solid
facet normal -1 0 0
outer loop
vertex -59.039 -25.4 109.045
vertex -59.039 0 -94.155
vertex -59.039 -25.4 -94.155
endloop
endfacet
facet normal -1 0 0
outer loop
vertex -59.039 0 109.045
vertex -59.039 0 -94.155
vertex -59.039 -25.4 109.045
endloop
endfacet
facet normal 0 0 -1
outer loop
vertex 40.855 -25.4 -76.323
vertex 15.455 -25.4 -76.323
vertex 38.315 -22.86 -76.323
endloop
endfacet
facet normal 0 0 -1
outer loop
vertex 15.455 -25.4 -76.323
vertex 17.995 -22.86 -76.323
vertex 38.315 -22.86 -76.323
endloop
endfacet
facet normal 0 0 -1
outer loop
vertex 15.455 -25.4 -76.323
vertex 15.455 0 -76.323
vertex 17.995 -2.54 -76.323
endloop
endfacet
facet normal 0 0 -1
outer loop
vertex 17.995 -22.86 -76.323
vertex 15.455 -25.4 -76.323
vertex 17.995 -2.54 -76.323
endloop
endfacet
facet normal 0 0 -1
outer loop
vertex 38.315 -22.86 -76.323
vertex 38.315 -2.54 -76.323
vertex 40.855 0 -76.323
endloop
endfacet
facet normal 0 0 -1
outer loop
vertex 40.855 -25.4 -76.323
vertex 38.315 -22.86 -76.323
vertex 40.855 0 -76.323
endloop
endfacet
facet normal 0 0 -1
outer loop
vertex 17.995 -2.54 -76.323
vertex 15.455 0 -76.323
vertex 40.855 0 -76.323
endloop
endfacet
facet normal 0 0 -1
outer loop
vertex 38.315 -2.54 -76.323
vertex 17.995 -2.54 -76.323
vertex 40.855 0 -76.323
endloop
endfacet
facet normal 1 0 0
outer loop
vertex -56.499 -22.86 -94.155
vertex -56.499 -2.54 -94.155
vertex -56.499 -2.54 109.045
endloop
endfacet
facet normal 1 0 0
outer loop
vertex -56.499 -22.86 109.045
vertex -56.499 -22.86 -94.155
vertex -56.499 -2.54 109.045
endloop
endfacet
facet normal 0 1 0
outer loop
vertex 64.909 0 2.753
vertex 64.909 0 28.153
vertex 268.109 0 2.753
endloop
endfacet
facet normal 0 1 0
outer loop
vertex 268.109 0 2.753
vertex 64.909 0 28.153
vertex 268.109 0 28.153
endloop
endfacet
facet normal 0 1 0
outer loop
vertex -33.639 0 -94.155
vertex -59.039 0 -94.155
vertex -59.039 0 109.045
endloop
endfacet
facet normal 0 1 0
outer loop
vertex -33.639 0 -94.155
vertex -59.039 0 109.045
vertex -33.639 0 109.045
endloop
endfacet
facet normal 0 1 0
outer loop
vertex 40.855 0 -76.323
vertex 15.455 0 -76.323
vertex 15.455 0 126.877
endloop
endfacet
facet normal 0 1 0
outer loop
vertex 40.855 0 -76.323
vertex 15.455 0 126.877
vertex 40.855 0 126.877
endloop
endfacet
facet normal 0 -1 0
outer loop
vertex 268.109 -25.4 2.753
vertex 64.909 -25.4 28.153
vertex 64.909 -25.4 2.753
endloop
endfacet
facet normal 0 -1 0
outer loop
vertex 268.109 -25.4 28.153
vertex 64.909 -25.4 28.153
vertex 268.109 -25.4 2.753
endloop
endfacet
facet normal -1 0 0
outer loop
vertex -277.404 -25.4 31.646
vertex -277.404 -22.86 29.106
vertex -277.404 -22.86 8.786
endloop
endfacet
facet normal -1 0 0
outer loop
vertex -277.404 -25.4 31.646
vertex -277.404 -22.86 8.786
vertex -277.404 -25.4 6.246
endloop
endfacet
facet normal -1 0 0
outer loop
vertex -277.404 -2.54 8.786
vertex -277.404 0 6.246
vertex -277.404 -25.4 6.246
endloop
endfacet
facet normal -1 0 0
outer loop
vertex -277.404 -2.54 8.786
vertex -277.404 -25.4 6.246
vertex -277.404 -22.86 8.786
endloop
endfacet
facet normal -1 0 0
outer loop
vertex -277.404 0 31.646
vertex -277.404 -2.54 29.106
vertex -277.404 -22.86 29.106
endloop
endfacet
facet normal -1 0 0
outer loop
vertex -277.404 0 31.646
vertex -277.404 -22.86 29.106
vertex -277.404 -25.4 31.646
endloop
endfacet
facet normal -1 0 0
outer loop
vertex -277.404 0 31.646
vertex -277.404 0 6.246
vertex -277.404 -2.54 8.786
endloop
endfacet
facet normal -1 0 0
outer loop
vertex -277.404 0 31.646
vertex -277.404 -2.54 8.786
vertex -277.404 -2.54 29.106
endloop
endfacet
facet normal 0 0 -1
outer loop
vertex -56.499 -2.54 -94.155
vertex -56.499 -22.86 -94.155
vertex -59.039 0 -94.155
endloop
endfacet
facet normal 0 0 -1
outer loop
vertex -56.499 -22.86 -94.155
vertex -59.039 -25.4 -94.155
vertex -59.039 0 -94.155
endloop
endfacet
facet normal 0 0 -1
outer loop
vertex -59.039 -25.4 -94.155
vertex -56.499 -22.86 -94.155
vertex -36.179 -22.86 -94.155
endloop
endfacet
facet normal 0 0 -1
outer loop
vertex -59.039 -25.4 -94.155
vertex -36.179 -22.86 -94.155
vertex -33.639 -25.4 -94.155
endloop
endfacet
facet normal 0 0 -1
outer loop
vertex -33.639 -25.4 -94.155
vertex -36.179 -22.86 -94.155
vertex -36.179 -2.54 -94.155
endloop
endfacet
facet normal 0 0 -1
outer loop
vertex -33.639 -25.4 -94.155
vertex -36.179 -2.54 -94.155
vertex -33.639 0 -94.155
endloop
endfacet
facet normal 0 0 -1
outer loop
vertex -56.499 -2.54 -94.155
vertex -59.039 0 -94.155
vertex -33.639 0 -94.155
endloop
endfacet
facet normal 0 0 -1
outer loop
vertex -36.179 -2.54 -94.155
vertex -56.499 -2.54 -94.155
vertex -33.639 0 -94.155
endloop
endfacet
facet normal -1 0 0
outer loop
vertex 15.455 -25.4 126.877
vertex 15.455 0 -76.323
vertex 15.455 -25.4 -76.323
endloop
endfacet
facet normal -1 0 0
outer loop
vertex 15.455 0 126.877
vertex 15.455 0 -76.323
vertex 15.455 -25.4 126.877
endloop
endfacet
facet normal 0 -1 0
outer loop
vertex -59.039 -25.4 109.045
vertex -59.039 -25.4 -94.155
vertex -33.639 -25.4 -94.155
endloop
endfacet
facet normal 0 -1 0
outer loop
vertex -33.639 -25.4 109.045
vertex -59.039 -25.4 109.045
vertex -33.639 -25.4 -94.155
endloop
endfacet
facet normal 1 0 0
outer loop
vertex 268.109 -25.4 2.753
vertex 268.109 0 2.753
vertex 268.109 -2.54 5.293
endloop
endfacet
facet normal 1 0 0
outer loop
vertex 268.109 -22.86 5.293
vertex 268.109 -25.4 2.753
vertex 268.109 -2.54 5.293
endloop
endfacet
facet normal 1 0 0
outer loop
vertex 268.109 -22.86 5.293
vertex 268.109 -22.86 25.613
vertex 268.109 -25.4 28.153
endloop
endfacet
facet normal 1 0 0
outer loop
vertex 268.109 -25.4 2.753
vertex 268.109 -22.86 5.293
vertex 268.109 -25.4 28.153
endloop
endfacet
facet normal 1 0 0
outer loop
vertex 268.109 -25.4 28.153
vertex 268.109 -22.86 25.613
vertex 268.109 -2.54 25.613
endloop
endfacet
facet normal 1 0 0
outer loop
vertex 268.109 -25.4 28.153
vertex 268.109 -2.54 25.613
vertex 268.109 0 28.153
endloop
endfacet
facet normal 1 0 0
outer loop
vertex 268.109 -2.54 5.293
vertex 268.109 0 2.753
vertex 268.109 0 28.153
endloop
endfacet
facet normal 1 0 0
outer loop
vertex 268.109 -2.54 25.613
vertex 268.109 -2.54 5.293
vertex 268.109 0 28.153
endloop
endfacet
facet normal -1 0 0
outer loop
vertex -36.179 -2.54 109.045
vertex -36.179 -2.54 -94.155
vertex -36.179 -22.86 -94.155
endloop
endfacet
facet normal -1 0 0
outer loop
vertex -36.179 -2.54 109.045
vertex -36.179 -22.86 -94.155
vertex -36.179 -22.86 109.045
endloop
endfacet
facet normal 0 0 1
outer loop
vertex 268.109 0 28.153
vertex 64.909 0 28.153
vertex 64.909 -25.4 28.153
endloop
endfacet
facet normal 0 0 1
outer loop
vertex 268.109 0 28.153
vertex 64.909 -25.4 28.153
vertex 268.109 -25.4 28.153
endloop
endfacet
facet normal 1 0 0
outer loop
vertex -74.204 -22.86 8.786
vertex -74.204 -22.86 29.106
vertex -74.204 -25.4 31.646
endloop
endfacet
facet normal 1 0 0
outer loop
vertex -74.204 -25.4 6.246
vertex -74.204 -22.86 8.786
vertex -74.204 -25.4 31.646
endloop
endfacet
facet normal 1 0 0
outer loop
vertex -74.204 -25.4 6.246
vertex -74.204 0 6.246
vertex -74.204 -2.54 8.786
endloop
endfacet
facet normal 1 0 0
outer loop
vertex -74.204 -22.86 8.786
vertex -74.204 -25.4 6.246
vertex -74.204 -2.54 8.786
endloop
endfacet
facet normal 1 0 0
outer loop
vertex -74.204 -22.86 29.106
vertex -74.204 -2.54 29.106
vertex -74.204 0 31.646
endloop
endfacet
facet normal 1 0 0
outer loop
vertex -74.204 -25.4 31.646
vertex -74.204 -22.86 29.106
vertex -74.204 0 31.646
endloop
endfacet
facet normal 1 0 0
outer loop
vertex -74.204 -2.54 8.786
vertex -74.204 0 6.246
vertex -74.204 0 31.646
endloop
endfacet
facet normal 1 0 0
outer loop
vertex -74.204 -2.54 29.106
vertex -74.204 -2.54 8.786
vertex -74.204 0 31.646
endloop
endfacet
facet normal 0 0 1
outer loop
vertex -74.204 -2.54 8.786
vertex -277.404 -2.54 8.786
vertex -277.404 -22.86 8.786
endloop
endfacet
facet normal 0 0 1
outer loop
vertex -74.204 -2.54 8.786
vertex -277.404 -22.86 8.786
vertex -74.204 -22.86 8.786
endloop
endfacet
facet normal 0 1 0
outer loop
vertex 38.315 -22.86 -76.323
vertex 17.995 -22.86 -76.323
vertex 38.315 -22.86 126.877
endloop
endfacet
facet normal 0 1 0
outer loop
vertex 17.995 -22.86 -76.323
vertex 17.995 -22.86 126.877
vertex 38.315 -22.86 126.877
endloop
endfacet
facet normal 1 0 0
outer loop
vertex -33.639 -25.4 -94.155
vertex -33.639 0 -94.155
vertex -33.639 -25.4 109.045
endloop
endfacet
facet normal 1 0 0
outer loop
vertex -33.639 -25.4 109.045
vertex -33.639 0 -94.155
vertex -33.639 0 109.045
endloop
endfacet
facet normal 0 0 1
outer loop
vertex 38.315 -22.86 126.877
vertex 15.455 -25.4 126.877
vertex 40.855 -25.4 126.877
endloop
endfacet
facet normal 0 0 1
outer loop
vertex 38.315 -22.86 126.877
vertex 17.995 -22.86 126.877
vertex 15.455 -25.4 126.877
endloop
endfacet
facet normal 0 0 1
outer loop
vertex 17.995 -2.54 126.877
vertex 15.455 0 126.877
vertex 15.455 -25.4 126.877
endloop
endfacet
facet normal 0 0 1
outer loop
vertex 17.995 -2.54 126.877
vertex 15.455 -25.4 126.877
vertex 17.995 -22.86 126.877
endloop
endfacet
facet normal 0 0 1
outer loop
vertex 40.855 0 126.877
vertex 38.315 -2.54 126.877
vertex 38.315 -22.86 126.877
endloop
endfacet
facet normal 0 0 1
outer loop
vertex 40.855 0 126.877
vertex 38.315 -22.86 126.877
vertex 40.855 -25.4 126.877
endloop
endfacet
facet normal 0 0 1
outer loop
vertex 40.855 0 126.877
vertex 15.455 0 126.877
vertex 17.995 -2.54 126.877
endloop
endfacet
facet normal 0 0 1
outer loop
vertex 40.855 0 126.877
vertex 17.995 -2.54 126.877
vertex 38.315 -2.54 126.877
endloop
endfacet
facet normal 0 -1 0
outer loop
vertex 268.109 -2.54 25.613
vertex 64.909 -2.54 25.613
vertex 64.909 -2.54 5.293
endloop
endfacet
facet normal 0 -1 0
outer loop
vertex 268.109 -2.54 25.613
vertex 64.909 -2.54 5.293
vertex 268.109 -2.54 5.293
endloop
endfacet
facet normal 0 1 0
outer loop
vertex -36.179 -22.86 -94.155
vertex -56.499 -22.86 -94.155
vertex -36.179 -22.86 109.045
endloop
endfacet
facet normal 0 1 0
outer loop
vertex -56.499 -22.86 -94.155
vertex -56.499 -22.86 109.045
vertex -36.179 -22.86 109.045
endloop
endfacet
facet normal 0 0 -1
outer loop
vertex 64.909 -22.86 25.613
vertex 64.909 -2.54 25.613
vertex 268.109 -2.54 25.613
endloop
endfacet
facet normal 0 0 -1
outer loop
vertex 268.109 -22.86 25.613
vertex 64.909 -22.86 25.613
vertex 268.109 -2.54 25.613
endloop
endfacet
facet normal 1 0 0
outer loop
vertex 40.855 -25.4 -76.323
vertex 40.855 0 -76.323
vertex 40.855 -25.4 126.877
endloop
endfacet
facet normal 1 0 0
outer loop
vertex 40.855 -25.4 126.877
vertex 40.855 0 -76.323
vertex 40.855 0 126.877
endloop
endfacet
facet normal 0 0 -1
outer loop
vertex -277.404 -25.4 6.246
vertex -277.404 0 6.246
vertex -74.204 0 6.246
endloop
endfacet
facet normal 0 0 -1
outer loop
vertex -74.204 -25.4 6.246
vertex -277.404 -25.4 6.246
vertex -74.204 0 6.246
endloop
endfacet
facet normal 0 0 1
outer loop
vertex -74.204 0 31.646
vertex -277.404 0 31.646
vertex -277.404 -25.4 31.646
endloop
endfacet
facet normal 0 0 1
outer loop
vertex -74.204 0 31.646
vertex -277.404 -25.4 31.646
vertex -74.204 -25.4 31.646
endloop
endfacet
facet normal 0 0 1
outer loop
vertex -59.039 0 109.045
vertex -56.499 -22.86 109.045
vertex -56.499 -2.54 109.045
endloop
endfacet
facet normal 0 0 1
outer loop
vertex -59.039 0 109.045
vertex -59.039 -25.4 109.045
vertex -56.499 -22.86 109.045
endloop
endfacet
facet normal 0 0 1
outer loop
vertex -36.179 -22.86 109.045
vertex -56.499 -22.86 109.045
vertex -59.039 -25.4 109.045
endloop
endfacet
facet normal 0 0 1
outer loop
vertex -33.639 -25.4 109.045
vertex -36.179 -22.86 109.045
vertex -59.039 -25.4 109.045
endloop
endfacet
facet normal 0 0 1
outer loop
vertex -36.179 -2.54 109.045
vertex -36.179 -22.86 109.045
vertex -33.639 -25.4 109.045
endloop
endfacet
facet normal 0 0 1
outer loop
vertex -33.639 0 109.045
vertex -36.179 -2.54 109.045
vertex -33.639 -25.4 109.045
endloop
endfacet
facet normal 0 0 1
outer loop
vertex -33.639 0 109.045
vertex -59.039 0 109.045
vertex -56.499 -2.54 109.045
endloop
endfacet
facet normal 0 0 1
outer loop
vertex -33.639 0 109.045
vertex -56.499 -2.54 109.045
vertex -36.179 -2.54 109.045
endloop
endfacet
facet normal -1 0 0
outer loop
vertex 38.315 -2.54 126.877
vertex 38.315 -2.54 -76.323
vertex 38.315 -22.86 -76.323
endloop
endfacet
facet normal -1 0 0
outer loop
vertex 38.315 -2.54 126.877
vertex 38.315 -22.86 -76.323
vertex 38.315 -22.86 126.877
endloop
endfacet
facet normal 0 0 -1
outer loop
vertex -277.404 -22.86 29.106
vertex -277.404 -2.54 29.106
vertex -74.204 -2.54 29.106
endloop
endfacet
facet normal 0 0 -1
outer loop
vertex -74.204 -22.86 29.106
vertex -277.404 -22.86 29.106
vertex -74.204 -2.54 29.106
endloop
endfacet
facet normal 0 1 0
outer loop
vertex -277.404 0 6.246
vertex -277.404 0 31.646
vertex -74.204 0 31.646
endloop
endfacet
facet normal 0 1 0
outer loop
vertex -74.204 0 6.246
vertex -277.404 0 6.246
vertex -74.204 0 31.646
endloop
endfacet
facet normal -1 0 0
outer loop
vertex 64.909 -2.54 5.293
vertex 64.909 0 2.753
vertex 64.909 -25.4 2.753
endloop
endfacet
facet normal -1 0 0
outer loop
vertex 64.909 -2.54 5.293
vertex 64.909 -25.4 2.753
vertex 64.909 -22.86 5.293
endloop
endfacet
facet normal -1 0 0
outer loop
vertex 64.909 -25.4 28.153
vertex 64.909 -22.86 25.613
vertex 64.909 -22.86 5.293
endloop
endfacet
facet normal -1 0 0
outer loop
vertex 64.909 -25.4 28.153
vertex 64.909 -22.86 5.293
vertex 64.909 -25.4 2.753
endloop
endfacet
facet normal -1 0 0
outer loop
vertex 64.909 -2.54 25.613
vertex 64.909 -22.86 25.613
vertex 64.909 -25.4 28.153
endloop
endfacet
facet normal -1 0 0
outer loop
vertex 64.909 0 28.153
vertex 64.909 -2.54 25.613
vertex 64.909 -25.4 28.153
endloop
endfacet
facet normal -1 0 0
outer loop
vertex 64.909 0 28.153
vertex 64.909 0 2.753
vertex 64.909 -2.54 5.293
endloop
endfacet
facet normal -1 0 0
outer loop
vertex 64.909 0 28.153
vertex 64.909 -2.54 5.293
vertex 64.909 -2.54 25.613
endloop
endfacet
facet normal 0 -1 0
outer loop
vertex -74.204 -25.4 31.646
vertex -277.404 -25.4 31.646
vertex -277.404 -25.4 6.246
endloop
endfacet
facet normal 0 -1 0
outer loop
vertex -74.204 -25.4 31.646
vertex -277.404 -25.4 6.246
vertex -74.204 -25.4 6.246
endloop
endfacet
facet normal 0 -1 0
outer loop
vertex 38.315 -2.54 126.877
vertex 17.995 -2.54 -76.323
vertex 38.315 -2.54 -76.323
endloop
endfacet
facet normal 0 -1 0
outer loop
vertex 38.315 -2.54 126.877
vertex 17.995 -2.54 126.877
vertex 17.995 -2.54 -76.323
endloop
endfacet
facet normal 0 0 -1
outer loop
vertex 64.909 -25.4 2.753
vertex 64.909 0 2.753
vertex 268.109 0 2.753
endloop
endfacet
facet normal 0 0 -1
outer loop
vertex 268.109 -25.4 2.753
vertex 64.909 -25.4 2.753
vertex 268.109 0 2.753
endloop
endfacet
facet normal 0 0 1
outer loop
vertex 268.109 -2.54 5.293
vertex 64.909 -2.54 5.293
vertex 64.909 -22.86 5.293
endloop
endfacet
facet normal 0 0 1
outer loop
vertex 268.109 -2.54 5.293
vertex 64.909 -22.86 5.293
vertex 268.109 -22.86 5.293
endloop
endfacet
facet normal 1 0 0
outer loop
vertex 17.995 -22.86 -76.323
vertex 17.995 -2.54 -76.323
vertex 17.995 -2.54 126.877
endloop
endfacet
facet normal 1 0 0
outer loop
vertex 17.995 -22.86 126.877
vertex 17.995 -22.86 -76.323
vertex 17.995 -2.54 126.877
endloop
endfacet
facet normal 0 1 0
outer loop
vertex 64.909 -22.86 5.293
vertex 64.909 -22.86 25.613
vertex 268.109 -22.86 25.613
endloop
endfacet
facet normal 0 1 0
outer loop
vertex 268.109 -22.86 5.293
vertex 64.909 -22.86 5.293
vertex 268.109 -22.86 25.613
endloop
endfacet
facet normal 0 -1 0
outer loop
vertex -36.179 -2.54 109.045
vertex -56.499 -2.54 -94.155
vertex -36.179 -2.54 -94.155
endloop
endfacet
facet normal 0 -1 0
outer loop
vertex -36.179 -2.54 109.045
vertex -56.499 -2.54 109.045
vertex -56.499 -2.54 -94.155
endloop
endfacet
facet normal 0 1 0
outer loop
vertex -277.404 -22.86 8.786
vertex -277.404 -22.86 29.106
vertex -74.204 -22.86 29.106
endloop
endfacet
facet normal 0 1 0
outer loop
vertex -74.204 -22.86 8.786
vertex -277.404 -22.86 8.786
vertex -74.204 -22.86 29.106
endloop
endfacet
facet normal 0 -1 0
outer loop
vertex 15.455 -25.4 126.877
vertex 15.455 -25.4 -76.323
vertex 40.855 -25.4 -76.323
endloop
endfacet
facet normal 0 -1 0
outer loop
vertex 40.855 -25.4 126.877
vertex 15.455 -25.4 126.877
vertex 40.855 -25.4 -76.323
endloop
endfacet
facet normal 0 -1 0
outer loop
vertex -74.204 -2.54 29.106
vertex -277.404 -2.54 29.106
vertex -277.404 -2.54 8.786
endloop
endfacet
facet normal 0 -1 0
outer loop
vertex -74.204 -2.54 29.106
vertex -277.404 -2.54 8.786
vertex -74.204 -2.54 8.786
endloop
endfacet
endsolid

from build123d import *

# Parameters (mm, degrees)
F0_W     = 25.4
F0_H     = 203.2
F1_DEPTH = 25.4
F0_W_2   = 203.2
F0_H_2   = 25.4
F2_T     = -2.54
F2_2_T   = -2.54
F2_3_T   = -2.54
F2_4_T   = -2.54


with BuildPart() as f1:
    # F0 (on Front) → F1 (new body)
    with BuildSketch(Plane.XZ):
        with Locations((-46.3385161425, 7.4449833483)):
            Rectangle(F0_W, F0_H)
    extrude(amount=F1_DEPTH)

    # F2#2
    f2_2_openings = [f1.faces().sort_by_distance(p)[0] for p in [
        (-46.338516, -12.7, 109.044983),
        (-46.338516, -12.7, -94.155017),
    ]]
    offset(amount=F2_2_T, openings=f2_2_openings)


with BuildPart() as f1b:
    # F0 (on Front) → F1, piece 2 (new body)
    with BuildSketch(Plane.XZ):
        with Locations((28.1554080218, 25.2773252487)):
            Rectangle(F0_W, F0_H)
    extrude(amount=F1_DEPTH)

    # F2
    f2_openings = [f1b.faces().sort_by_distance(p)[0] for p in [
        (28.155408, -12.7, 126.877325),
        (28.155408, -12.7, -76.322675),
    ]]
    offset(amount=F2_T, openings=f2_openings)


with BuildPart() as f1c:
    # F0 (on Front) → F1, piece 3 (new body)
    with BuildSketch(Plane.XZ):
        with Locations((166.5089366198, 15.4533425018)):
            Rectangle(F0_W_2, F0_H_2)
    extrude(amount=F1_DEPTH)

    # F2#4
    f2_4_openings = [f1c.faces().sort_by_distance(p)[0] for p in [
        (268.108937, -12.7, 15.453343),
        (64.908937, -12.7, 15.453343),
    ]]
    offset(amount=F2_4_T, openings=f2_4_openings)


with BuildPart() as f1d:
    # F0 (on Front) → F1, piece 4 (new body)
    with BuildSketch(Plane.XZ):
        with Locations((-175.8043679237, 18.9456247397)):
            Rectangle(F0_W_2, F0_H_2)
    extrude(amount=F1_DEPTH)

    # F2#3
    f2_3_openings = [f1d.faces().sort_by_distance(p)[0] for p in [
        (-74.204368, -12.7, 18.945625),
        (-277.404368, -12.7, 18.945625),
    ]]
    offset(amount=F2_3_T, openings=f2_3_openings)


solid = Compound([f1.part, f1b.part, f1c.part, f1d.part])
